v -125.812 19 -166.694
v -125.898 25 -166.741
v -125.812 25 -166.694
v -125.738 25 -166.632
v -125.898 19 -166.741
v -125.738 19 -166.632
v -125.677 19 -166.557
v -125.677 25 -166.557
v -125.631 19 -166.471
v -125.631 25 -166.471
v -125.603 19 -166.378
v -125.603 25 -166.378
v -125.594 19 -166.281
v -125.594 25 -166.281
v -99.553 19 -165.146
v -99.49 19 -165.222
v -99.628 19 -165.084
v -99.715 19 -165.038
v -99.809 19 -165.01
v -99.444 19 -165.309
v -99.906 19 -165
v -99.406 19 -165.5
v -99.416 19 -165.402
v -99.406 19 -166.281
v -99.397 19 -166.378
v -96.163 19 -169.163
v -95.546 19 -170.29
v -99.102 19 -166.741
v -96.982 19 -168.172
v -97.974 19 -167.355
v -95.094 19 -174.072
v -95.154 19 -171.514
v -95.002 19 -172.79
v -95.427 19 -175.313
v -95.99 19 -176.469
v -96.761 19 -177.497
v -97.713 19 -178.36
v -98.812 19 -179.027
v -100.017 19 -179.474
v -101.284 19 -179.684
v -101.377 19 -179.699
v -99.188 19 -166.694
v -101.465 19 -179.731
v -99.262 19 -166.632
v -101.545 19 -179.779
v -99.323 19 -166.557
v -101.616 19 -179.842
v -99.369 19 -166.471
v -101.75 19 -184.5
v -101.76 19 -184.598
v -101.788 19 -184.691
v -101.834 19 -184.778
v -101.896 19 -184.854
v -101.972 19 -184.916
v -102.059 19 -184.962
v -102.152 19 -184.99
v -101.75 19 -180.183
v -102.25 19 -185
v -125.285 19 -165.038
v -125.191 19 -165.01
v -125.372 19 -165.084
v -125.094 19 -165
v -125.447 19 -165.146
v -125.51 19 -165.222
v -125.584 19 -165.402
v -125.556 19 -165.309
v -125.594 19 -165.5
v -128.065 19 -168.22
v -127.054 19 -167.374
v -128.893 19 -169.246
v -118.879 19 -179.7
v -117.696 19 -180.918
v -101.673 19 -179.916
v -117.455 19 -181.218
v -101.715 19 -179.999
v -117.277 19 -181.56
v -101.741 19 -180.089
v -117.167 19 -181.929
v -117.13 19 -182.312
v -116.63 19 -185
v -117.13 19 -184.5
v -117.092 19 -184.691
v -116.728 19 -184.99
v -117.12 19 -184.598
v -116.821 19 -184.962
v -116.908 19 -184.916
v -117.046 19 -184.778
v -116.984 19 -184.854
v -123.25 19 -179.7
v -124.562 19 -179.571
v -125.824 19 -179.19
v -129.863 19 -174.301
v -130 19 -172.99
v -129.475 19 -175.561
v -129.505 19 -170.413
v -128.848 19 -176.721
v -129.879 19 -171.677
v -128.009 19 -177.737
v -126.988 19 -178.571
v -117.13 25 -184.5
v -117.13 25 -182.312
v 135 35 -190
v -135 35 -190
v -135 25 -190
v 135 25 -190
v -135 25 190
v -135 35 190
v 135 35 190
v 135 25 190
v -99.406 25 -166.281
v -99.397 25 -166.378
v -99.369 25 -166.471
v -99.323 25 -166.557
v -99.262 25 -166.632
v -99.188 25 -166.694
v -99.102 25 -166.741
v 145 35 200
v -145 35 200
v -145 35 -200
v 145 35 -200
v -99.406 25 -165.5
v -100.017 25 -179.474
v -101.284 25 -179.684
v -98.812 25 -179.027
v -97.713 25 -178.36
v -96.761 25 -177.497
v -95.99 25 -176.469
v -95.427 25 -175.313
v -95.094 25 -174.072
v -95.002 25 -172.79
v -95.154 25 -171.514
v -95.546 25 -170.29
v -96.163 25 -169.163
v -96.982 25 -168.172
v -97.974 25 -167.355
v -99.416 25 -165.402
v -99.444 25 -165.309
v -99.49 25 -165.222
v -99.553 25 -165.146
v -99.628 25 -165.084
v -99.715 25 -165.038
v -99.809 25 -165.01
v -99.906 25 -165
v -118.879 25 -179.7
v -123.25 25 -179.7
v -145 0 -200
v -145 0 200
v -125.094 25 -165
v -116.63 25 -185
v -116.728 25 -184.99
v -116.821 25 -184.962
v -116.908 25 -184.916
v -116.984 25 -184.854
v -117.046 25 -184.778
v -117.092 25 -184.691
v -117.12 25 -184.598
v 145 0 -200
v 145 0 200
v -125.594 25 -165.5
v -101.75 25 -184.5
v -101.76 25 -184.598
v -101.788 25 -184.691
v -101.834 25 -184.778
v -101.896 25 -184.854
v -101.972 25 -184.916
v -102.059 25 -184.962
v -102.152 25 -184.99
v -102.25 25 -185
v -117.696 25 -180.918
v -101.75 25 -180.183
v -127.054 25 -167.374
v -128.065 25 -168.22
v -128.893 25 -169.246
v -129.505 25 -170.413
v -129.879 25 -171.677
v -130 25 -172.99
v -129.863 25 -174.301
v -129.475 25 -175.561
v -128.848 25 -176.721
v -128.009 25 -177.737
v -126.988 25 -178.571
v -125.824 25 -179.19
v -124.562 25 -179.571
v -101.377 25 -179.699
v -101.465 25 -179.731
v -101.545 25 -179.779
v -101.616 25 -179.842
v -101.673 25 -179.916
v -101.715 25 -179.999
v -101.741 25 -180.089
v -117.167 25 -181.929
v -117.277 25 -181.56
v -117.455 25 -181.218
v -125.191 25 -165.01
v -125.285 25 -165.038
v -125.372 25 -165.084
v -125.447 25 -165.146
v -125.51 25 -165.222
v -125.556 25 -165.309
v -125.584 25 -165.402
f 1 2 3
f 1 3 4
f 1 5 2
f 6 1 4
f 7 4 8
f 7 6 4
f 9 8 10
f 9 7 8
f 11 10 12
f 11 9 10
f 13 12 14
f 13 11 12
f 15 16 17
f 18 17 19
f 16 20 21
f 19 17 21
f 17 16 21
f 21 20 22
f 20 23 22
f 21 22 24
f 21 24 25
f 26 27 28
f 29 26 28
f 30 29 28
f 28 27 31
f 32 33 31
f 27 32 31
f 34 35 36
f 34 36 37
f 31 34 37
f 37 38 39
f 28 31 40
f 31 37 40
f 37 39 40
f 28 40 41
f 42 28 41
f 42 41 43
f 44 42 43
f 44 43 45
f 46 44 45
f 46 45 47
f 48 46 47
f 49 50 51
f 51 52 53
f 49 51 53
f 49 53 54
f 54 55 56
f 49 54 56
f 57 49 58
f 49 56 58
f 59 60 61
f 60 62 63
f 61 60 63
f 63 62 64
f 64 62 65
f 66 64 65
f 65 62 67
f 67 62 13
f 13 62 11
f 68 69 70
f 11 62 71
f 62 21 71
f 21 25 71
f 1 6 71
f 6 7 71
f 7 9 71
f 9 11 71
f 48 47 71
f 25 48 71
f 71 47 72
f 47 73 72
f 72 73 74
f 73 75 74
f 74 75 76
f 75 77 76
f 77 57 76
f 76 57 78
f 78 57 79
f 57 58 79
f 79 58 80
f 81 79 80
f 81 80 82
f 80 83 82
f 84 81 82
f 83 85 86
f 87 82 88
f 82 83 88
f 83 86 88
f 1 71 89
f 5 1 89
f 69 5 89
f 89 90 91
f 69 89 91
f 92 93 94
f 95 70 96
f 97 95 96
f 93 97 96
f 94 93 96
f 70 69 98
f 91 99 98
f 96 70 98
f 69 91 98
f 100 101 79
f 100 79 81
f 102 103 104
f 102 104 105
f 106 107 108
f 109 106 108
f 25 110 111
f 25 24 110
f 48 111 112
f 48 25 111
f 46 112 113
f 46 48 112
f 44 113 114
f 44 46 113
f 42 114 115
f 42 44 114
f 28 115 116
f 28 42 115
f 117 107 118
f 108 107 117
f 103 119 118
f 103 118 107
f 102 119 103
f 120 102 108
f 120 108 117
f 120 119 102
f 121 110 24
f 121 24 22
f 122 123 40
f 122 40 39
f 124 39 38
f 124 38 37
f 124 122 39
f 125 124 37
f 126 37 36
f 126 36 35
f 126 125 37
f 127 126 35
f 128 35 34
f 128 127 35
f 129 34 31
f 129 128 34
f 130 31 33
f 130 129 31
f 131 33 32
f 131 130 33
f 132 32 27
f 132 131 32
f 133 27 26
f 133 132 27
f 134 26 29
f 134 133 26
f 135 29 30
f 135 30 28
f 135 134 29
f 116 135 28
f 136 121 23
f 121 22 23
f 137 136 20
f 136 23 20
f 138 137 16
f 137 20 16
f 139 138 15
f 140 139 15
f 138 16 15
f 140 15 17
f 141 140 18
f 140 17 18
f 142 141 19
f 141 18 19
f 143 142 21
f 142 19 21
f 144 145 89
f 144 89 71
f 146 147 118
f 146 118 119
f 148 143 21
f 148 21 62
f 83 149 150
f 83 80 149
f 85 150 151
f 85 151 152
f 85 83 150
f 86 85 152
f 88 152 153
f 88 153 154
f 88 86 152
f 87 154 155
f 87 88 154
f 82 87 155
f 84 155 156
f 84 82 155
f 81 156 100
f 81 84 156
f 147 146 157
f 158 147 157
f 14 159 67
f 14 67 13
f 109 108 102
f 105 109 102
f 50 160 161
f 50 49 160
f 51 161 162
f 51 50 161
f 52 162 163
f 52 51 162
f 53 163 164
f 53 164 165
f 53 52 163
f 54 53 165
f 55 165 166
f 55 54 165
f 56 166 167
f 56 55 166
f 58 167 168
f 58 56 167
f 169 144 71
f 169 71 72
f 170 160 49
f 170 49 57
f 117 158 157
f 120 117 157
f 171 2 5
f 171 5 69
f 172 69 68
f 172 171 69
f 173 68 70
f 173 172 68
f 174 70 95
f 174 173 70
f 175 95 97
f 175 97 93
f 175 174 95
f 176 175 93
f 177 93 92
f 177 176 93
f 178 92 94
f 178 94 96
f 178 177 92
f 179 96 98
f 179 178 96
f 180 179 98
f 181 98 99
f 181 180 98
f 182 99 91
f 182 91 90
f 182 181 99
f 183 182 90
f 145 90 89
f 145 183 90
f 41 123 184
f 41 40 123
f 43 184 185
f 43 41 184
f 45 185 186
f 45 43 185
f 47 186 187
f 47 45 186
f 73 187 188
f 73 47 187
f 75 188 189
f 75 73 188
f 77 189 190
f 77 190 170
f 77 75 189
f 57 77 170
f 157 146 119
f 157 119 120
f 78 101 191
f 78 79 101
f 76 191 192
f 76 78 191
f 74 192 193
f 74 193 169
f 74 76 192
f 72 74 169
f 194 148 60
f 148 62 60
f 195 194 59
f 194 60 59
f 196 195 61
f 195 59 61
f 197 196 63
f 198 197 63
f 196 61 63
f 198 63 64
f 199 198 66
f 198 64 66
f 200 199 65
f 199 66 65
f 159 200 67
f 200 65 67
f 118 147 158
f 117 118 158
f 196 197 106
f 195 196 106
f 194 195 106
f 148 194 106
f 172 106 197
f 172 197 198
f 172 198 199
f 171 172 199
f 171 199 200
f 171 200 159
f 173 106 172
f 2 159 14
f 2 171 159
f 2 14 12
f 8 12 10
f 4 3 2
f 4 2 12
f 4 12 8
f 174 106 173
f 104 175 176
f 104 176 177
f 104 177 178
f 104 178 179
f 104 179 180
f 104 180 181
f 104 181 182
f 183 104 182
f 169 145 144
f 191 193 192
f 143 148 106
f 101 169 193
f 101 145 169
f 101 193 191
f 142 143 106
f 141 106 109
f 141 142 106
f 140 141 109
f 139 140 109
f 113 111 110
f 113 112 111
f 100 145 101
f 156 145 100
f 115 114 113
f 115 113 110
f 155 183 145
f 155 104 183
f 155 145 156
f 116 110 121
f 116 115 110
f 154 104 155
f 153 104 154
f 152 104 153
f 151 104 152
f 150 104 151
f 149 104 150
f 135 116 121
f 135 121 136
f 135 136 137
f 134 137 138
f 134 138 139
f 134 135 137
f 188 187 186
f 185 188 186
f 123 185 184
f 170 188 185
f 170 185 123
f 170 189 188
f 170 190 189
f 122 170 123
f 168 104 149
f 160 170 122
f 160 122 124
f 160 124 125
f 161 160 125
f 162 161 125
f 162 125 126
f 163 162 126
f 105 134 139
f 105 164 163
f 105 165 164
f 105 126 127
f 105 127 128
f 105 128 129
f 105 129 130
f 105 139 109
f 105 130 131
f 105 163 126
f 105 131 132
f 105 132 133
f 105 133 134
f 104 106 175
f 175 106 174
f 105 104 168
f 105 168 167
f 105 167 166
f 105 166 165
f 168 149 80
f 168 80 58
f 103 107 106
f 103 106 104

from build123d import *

# Parameters (mm, degrees)
SKETCH1_W           = 290
SKETCH1_H           = 400
BOSS_EXTRUDE1_DEPTH = 35
SKETCH2_W           = 270
SKETCH2_H           = 380
CUT_EXTRUDE2_DEPTH  = 10
CUT_EXTRUDE3_DEPTH  = 6
FILLET2_R           = 2
FILLET4_R           = 0.5
FILLET5_R           = 0.5
FILLET6_R           = 0.5
FILLET7_R           = 0.5
FILLET8_R           = 0.5
FILLET9_R           = 0.5


with BuildPart() as part:
    # Sketch1 → Boss-Extrude1 (new body)
    with BuildSketch(Plane(origin=(0, 0, 0), x_dir=(1, 0, 0), z_dir=(0, 1, 0))):
        Rectangle(SKETCH1_W, SKETCH1_H)
    extrude(amount=BOSS_EXTRUDE1_DEPTH)

    # Sketch2 → Cut-Extrude2 (cut)
    with BuildSketch(Plane(origin=(0, 35, 0), x_dir=(1, 0, 0), z_dir=(0, 1, 0))):
        Rectangle(SKETCH2_W, SKETCH2_H)
    extrude(amount=-CUT_EXTRUDE2_DEPTH, mode=Mode.SUBTRACT)

    # Sketch3 → Cut-Extrude3 (cut)
    with BuildSketch(Plane(origin=(0, 25, 0), x_dir=(1, 0, 0), z_dir=(0, 1, 0))):
        with BuildLine():
            Line((-101.75, 185), (-117.13, 185))
            Line((-117.13, 185), (-117.13, 181.5))
            Line((-117.13, 181.5), (-118.879314151, 179.7))
            Line((-118.879314151, 179.7), (-123.25, 179.7))
            ThreePointArc((-123.25, 179.7), (-129.894170377, 174.14058809), (-125.593842998, 166.62))
            Line((-125.593842998, 166.62), (-125.593842998, 165))
            Line((-125.593842998, 165), (-99.406157002, 165))
            Line((-99.406157002, 165), (-99.406157002, 166.62))
            ThreePointArc((-99.406157002, 166.62), (-95.105829623, 174.14058809), (-101.75, 179.7))
            Line((-101.75, 179.7), (-101.75, 185))
        make_face()
    extrude(amount=-CUT_EXTRUDE3_DEPTH, mode=Mode.SUBTRACT)

    # Fillet2
    fillet2_edges = [part.edges().sort_by_distance(p)[0] for p in [
        (-117.13, 22, -181.5),
    ]]
    fillet(fillet2_edges, radius=FILLET2_R)

    # Fillet4
    fillet4_edges = [part.edges().sort_by_distance(p)[0] for p in [
        (-125.593842998, 22, -166.62),
    ]]
    fillet(fillet4_edges, radius=FILLET4_R)

    # Fillet5
    fillet5_edges = [part.edges().sort_by_distance(p)[0] for p in [
        (-99.406157002, 22, -166.62),
    ]]
    fillet(fillet5_edges, radius=FILLET5_R)

    # Fillet6
    fillet6_edges = [part.edges().sort_by_distance(p)[0] for p in [
        (-101.75, 22, -179.7),
    ]]
    fillet(fillet6_edges, radius=FILLET6_R)

    # Fillet7
    fillet7_edges = [part.edges().sort_by_distance(p)[0] for p in [
        (-101.75, 22, -185),
    ]]
    fillet(fillet7_edges, radius=FILLET7_R)

    # Fillet8
    fillet8_edges = [part.edges().sort_by_distance(p)[0] for p in [
        (-117.13, 22, -185),
    ]]
    fillet(fillet8_edges, radius=FILLET8_R)

    # Fillet9
    fillet9_edges = [part.edges().sort_by_distance(p)[0] for p in [
        (-125.593842998, 22, -165),
        (-99.406157002, 22, -165),
    ]]
    fillet(fillet9_edges, radius=FILLET9_R)


solid = part.part
